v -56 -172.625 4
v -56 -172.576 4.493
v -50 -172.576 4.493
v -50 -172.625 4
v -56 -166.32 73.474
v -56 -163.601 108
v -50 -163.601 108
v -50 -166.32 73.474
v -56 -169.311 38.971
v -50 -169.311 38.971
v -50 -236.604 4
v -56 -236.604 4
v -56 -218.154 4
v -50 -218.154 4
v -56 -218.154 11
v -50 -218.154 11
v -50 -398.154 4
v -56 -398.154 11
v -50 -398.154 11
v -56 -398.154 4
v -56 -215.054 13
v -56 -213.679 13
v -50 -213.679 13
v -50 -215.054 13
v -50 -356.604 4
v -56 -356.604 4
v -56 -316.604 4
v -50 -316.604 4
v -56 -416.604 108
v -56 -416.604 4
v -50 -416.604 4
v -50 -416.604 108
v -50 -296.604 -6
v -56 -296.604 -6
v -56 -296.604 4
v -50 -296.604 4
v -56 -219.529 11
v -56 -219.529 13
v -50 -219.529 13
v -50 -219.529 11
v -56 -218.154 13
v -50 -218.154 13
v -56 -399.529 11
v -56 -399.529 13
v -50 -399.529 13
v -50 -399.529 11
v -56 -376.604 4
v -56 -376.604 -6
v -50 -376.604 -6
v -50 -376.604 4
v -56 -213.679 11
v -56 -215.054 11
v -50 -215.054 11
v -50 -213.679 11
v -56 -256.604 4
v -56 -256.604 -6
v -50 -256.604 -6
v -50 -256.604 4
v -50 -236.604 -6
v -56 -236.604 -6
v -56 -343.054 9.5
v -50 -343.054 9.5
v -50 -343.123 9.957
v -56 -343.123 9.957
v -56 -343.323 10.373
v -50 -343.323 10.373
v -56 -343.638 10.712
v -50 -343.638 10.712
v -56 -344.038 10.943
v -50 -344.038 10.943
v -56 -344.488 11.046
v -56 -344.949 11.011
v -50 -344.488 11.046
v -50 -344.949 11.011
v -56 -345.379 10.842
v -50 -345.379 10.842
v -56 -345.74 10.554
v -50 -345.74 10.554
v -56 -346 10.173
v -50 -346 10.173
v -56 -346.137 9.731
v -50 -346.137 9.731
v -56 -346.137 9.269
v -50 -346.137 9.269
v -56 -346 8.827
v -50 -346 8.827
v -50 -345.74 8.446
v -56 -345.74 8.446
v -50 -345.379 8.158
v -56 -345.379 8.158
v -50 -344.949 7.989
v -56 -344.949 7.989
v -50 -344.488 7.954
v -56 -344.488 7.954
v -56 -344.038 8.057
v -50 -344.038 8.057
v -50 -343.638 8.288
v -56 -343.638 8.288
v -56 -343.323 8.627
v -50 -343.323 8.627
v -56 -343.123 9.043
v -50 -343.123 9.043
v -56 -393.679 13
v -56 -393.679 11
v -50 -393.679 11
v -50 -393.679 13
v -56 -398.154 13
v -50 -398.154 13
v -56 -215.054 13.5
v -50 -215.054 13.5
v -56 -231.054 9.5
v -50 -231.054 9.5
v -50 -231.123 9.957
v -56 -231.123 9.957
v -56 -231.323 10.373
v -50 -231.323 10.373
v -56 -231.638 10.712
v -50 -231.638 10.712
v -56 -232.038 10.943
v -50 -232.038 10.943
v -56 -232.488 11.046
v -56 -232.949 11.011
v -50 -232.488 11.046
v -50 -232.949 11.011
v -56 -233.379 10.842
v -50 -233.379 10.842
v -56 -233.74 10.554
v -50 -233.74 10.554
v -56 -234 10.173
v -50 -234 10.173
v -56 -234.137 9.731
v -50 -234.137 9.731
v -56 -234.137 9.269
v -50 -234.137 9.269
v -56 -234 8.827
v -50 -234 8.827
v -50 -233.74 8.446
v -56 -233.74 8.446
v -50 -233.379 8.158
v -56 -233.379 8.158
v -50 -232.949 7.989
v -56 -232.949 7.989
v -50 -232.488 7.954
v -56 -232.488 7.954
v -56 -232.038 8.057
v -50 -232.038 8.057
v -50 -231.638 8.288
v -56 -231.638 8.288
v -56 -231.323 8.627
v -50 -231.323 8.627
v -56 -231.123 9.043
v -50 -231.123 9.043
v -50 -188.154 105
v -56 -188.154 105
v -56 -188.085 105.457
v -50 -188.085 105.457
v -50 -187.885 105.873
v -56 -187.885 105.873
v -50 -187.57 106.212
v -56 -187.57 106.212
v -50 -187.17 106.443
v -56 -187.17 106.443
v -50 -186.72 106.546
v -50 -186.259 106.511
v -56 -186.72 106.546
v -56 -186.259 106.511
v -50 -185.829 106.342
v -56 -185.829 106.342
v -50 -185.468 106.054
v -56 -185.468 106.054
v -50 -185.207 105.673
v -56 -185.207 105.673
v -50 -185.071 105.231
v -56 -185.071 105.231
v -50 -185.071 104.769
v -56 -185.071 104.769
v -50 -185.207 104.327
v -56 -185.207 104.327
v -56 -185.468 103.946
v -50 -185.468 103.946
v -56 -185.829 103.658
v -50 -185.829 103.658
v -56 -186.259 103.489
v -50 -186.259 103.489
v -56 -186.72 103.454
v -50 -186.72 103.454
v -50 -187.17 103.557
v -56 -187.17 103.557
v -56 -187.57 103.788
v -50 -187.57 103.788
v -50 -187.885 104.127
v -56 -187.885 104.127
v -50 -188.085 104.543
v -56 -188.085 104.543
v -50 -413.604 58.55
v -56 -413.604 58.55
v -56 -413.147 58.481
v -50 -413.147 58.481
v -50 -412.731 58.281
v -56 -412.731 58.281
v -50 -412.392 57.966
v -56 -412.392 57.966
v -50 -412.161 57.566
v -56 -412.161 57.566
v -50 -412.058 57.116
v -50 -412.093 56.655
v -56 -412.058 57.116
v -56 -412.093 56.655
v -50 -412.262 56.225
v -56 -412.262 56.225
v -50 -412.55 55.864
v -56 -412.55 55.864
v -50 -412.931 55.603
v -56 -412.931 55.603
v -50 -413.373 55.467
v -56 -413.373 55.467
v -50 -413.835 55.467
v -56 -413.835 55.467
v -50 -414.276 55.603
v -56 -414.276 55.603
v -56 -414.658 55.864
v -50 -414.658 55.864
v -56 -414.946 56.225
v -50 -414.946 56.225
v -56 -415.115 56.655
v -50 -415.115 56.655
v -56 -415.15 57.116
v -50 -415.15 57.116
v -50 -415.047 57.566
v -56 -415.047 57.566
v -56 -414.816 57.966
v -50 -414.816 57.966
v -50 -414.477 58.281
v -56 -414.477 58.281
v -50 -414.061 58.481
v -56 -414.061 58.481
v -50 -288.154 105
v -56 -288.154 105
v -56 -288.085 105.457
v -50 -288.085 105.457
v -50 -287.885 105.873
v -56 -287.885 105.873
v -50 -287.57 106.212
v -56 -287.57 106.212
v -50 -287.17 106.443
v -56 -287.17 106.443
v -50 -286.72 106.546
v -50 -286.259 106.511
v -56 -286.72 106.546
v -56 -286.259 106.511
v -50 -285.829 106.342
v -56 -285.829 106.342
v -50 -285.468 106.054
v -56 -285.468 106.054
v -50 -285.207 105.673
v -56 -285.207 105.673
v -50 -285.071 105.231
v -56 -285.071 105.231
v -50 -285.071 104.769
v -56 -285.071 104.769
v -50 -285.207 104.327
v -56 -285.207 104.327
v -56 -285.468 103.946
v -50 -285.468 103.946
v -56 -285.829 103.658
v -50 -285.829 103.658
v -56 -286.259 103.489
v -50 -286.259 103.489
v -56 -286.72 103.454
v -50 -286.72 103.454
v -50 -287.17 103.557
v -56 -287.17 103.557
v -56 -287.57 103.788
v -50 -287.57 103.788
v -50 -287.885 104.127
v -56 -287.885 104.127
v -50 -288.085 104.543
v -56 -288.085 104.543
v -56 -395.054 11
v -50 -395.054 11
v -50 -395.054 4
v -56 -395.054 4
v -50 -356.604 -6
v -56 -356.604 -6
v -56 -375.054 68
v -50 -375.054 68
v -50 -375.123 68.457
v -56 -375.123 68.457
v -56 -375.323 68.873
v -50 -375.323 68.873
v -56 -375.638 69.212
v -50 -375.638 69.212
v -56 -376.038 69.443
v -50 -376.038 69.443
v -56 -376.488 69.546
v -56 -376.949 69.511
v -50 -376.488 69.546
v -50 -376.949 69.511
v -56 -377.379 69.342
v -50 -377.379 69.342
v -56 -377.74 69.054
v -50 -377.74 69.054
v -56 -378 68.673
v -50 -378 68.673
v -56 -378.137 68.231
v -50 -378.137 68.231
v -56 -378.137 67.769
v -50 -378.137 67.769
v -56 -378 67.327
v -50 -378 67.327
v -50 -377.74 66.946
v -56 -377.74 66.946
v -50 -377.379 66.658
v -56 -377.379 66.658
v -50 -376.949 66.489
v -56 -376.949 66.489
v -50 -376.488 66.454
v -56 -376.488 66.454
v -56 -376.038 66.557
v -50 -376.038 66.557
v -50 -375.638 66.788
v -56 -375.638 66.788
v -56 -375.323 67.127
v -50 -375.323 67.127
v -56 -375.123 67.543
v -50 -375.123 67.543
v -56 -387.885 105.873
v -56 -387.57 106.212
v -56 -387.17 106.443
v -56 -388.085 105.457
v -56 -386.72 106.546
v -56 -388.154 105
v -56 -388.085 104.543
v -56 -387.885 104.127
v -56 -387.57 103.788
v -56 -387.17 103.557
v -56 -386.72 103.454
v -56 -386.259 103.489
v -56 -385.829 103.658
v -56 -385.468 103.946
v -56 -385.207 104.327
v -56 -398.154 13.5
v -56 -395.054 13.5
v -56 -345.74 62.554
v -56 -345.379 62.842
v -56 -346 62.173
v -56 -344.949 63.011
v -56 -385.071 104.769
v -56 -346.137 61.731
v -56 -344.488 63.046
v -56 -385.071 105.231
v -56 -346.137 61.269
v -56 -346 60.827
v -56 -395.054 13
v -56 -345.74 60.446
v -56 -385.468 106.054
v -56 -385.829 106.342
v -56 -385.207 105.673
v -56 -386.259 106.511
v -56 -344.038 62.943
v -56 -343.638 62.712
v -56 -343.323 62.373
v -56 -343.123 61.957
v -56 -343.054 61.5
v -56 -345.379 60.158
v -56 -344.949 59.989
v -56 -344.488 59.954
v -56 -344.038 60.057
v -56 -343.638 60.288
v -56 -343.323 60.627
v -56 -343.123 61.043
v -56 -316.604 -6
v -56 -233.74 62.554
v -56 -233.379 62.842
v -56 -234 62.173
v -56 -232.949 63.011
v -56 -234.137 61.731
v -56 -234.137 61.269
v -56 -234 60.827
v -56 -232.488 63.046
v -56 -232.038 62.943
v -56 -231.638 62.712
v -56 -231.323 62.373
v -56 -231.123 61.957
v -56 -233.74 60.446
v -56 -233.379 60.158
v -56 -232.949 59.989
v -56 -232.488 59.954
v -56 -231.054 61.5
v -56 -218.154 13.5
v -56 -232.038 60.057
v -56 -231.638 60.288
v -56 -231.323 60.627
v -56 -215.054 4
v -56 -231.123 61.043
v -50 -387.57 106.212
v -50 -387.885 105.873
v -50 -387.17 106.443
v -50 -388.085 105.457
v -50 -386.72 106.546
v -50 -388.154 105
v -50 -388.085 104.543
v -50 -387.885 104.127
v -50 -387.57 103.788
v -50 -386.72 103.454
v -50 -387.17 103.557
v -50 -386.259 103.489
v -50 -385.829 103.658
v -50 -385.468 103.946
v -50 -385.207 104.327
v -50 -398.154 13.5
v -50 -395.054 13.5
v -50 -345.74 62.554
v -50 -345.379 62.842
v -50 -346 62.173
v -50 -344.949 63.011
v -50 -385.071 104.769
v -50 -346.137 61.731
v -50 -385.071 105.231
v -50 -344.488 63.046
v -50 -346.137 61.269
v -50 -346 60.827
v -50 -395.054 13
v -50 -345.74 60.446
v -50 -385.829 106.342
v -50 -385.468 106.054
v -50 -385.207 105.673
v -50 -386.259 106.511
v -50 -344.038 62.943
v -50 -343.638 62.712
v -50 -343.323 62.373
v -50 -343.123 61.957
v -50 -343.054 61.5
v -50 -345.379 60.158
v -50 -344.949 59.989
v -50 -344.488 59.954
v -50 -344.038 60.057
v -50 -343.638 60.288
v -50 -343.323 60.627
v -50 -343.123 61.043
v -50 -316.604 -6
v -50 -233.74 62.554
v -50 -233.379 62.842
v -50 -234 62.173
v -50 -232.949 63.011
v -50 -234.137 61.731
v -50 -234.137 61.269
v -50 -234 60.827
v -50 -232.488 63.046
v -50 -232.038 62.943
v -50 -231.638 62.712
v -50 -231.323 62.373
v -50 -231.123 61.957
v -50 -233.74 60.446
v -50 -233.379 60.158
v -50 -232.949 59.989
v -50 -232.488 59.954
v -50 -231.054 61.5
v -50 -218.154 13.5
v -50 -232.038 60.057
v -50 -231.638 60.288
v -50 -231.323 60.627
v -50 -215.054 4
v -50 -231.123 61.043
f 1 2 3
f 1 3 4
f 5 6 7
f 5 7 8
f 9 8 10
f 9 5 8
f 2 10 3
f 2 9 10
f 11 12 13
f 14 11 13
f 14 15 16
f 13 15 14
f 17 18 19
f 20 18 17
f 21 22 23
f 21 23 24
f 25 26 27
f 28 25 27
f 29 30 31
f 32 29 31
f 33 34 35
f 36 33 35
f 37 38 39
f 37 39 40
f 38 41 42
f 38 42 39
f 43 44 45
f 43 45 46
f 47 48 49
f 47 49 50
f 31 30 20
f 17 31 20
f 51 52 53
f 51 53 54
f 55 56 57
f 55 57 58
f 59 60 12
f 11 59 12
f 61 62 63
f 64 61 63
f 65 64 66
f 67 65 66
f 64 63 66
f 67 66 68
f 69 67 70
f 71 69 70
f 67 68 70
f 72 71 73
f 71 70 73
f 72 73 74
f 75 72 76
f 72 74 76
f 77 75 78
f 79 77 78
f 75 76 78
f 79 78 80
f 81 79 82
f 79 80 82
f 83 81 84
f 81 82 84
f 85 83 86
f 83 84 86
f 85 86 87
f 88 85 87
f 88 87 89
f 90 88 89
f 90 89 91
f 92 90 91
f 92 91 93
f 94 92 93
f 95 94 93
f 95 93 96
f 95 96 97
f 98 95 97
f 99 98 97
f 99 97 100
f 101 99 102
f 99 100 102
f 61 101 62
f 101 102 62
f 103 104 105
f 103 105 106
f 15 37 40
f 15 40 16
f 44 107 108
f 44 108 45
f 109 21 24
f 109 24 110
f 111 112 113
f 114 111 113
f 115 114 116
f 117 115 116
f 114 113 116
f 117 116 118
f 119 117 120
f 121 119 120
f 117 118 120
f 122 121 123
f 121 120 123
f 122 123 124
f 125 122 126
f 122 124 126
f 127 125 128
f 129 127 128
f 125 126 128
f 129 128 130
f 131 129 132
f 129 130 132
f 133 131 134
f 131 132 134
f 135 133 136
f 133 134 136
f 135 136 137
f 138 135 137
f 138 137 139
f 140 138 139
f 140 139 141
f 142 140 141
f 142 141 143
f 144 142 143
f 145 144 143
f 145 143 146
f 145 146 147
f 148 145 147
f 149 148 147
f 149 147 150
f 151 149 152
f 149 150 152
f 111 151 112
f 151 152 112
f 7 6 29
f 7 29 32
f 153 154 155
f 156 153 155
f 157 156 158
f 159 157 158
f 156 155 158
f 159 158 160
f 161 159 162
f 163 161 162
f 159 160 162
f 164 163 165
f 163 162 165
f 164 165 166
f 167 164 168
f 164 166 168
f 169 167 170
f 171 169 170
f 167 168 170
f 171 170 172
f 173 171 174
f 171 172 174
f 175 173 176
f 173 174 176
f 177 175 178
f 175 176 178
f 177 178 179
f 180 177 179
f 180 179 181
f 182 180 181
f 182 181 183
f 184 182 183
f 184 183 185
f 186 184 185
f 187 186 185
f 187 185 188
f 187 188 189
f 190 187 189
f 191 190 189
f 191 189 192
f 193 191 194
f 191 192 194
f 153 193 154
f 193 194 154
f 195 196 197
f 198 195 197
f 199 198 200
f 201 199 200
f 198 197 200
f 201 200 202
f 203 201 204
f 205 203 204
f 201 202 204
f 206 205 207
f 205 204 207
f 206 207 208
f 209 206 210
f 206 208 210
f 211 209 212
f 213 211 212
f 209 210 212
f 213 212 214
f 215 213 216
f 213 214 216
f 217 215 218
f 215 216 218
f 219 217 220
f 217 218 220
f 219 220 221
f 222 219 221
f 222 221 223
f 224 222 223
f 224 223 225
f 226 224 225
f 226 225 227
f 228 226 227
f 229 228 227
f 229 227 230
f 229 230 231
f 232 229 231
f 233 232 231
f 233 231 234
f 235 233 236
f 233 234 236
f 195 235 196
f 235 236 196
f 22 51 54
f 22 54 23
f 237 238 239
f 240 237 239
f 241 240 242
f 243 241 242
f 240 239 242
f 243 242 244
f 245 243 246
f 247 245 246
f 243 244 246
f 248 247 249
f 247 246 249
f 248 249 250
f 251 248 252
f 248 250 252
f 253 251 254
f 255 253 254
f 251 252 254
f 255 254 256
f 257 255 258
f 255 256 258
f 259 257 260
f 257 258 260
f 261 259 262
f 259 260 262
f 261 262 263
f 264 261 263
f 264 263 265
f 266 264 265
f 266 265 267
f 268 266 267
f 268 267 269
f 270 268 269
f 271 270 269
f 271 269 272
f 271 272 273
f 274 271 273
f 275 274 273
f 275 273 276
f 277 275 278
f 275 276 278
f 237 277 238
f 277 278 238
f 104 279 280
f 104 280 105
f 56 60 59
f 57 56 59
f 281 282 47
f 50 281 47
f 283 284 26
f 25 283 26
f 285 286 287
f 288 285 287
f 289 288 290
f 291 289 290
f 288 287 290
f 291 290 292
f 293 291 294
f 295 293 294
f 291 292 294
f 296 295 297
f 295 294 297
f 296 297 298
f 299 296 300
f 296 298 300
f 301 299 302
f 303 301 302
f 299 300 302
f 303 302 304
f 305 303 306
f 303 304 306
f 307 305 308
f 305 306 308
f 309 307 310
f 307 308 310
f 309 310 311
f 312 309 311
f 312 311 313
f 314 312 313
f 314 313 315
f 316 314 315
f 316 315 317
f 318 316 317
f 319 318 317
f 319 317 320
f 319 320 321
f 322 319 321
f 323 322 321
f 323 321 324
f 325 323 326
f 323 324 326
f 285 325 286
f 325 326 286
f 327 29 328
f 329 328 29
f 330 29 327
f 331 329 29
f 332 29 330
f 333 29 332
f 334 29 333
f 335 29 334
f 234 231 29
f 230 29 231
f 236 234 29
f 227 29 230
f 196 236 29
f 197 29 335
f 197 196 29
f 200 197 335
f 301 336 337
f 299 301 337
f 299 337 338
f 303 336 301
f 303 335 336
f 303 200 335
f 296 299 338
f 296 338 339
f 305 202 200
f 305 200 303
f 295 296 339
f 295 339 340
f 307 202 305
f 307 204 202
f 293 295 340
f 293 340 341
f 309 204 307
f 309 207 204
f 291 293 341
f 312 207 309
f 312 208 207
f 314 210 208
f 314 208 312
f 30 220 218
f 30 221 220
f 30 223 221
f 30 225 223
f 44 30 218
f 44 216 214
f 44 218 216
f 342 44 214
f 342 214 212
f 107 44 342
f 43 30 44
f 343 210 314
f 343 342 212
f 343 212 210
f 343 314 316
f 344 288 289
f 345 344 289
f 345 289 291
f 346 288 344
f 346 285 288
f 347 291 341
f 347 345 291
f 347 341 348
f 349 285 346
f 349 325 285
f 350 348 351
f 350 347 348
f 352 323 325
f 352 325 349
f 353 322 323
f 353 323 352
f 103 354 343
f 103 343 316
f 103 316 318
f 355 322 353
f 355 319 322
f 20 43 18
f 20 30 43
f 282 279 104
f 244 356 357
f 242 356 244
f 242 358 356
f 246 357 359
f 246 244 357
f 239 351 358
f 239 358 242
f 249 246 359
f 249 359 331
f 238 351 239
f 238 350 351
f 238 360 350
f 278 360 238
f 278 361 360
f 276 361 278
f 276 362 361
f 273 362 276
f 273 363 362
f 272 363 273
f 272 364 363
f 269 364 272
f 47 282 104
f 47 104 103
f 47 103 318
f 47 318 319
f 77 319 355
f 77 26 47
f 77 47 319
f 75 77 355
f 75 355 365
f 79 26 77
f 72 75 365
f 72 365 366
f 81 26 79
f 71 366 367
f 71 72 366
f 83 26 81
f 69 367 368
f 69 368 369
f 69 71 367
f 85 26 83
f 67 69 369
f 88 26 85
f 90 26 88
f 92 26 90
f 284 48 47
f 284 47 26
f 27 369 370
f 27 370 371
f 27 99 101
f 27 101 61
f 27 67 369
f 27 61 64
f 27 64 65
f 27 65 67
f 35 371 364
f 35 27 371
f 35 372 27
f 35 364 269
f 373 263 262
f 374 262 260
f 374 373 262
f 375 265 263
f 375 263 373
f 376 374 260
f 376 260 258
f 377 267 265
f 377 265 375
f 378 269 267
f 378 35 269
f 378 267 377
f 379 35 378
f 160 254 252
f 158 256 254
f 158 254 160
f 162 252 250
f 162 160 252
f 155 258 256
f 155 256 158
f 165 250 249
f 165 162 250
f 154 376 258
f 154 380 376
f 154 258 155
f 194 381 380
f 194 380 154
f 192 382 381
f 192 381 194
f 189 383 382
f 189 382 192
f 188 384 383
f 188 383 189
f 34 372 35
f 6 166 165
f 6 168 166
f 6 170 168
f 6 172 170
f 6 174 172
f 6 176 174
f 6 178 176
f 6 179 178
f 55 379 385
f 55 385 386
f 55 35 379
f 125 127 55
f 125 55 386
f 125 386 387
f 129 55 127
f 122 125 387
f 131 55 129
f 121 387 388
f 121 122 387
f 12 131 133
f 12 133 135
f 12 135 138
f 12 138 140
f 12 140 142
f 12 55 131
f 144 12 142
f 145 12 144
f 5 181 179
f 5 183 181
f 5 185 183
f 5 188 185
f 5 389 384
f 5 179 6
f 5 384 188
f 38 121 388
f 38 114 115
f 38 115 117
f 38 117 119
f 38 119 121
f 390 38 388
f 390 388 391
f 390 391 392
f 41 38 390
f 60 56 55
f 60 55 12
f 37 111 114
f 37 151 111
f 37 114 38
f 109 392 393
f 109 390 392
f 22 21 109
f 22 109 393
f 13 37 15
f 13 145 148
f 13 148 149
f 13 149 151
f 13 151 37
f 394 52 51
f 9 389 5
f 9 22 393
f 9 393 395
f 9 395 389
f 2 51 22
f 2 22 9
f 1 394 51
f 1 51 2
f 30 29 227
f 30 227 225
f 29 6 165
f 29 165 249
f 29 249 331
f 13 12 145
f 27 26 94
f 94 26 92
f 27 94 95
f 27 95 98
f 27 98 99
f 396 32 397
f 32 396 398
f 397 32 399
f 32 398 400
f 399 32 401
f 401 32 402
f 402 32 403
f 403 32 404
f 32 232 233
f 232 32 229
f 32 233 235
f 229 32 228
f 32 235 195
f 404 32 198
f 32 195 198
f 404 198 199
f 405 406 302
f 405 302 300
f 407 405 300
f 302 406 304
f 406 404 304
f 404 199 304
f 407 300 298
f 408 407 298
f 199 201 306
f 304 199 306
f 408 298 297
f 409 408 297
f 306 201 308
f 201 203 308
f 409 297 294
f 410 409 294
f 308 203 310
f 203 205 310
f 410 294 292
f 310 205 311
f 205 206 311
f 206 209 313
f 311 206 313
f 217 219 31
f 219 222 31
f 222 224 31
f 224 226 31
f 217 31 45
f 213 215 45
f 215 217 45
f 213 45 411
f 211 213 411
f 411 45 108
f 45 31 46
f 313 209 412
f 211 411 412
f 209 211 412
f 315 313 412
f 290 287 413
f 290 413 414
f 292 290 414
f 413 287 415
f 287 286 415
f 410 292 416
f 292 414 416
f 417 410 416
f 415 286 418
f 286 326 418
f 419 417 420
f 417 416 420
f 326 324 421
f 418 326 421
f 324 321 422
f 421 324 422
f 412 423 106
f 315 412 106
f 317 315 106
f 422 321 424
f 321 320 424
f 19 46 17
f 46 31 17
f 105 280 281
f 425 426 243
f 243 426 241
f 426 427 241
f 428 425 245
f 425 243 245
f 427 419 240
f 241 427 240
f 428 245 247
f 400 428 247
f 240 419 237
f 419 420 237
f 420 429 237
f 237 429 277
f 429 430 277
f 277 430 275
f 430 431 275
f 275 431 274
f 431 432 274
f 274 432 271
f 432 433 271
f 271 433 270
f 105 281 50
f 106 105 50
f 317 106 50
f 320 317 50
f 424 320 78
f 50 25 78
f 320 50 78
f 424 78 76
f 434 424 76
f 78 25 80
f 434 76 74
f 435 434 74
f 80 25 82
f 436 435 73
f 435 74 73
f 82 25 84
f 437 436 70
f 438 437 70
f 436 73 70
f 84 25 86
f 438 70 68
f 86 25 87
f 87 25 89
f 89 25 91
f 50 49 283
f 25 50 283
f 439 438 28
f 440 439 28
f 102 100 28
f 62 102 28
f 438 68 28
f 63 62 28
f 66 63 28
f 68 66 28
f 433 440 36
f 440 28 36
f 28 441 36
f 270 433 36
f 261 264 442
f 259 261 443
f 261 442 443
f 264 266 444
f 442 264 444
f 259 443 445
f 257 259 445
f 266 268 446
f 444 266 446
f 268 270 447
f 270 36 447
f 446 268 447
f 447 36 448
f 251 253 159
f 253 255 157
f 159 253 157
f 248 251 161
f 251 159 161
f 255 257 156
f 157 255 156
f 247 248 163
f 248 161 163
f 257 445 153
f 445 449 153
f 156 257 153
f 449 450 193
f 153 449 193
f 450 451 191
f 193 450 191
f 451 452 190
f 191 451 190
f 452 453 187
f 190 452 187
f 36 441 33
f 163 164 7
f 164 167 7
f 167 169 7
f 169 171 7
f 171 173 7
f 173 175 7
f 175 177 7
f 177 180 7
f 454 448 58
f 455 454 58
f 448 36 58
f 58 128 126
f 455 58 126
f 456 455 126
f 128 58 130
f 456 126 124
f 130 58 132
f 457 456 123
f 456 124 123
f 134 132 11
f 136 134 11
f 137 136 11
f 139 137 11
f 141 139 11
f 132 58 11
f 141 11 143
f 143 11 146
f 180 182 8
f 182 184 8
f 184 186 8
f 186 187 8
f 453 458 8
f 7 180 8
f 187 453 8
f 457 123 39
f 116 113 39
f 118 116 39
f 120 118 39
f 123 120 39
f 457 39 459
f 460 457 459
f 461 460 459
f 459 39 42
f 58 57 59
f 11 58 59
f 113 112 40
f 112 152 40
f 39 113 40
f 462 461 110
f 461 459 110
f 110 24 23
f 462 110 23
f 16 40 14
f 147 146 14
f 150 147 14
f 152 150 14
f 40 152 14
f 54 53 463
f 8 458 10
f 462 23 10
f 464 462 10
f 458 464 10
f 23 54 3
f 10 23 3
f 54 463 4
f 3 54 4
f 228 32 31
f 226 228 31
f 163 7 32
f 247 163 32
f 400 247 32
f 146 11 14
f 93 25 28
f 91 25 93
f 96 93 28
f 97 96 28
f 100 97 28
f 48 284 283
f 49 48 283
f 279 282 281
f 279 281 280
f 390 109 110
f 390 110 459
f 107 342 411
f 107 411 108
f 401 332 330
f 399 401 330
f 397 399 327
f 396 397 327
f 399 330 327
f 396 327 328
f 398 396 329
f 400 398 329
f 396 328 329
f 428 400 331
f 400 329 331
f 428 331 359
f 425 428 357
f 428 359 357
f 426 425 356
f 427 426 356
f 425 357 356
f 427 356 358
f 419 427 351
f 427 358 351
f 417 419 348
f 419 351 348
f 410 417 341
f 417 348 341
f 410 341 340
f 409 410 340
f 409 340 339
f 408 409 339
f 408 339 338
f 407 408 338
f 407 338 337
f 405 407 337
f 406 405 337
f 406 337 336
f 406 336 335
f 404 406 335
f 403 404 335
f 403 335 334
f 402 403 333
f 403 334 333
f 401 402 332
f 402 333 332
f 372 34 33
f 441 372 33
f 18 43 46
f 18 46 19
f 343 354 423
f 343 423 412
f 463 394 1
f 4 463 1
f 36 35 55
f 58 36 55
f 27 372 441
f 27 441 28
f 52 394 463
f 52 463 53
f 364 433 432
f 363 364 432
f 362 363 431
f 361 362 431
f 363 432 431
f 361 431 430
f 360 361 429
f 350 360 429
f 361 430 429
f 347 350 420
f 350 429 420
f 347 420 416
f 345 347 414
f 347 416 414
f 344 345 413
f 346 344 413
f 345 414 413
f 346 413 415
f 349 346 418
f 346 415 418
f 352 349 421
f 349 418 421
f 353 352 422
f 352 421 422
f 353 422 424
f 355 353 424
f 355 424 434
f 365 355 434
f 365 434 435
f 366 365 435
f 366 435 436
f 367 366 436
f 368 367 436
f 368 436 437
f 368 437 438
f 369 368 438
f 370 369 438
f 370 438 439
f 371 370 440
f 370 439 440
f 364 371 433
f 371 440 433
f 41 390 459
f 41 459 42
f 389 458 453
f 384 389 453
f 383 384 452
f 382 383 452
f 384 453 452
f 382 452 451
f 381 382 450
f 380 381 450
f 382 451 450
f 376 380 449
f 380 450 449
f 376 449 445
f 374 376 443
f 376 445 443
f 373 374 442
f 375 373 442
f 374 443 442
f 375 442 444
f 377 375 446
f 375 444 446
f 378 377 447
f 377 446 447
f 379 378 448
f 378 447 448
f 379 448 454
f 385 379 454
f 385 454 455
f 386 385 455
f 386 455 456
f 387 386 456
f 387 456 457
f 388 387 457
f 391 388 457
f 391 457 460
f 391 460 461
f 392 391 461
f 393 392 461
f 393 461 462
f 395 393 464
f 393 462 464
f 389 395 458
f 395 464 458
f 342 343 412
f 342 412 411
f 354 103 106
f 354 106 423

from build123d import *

# Parameters (mm, degrees)
DODANIE_WYCI_GNI_CIE1_DEPTH      = 108
DODANIE_WYCI_GNI_CIE1_DEPTH_BACK = 6
SZKIC1_W                         = 6
SZKIC1_H                         = 327
SZKIC2_W                         = 10
SZKIC2_H                         = 40
WYTNIJ_WYCI_GNI_CIE1_DEPTH       = 6
SZKIC7_R                         = 1.55
WYTNIJ_WYCI_GNI_CIE2_DEPTH       = 6
WYTNIJ_WYCI_GNI_CIE3_DEPTH       = 6
SZYK_LINIOWY1_COUNT              = 2
SZYK_LINIOWY1_PITCH              = 180
SZKIC9_W                         = 22
SZKIC9_H                         = 13
WYTNIJ_WYCI_GNI_CIE4_DEPTH       = 6
SZKIC11_R                        = 1.55
WYTNIJ_WYCI_GNI_CIE5_DEPTH       = 6
SZYK_LINIOWY2_COUNT              = 2
SZYK_LINIOWY2_PITCH              = 100
SZYK_LINIOWY2_COL_COUNT          = 2
SZYK_LINIOWY2_COL_PITCH          = 200
SZKIC14_R                        = 1.55
WYTNIJ_WYCI_GNI_CIE7_DEPTH       = 6
WYTNIJ_WYCI_GNI_CIE9_DEPTH       = 6


with BuildPart() as part:
    # Szkic1 → Dodanie-wyciągnięcie1 (new, two sides: drawn at the far end of the back side and taken through both)
    with BuildSketch(Plane.XY.offset(-DODANIE_WYCI_GNI_CIE1_DEPTH_BACK)):
        with Locations((-53, -253.103962956)):
            Rectangle(SZKIC1_W, SZKIC1_H)
    extrude(amount=DODANIE_WYCI_GNI_CIE1_DEPTH + DODANIE_WYCI_GNI_CIE1_DEPTH_BACK)

    # Szkic2 → Wytnij-wyciągnięcie1 (cut)
    with BuildSketch(Plane.ZY.offset(56)):
        with Locations((-1, -396.603962956)):
            Rectangle(SZKIC2_W, SZKIC2_H)
        with Locations((-1, -336.603962956)):
            Rectangle(SZKIC2_W, SZKIC2_H)
        Polygon((4, -176.603962956), (4, -42.619854706), (-6, -42.619854706), (-6, -176.603962956), (-6, -196.603962956), (-6, -236.603962956), (4, -236.603962956), (4, -196.603962956), align=None)
        with Locations((-1, -276.603962956)):
            Rectangle(SZKIC2_W, SZKIC2_H)
    extrude(amount=-WYTNIJ_WYCI_GNI_CIE1_DEPTH, mode=Mode.SUBTRACT)

    # Szkic7 → Wytnij-wyciągnięcie2 (cut)
    with BuildSketch(Plane.ZY.offset(56)):
        with Locations((57, -413.603962956)):
            Circle(SZKIC7_R)
    extrude(amount=-WYTNIJ_WYCI_GNI_CIE2_DEPTH, mode=Mode.SUBTRACT)

    # Szkic8 → Wytnij-wyciągnięcie3 (cut)
    with BuildSketch(Plane.ZY.offset(56)):
        Polygon((4, -395.053962956), (11, -395.053962956), (11, -393.678962956), (13, -393.678962956), (13, -395.053962956), (13.5, -395.053962956), (13.5, -398.153962956), (13, -398.153962956), (13, -399.528962956), (11, -399.528962956), (11, -398.153962956), (4, -398.153962956), align=None)
    wytnij_wyci_gni_cie3 = extrude(amount=-WYTNIJ_WYCI_GNI_CIE3_DEPTH, mode=Mode.SUBTRACT)

    # Szyk liniowy1: Wytnij-wyciągnięcie3 ×2
    with Locations(*[(0, i * SZYK_LINIOWY1_PITCH, 0) for i in range(1, SZYK_LINIOWY1_COUNT)]):
        add(wytnij_wyci_gni_cie3, mode=Mode.SUBTRACT)

    # Szkic9 → Wytnij-wyciągnięcie4 (cut)
    with BuildSketch(Plane.ZY.offset(56)):
        with Locations((65, -96.103962956)):
            Rectangle(SZKIC9_W, SZKIC9_H)
    extrude(amount=-WYTNIJ_WYCI_GNI_CIE4_DEPTH, mode=Mode.SUBTRACT)

    # Szkic11 → Wytnij-wyciągnięcie5 (cut)
    with BuildSketch(Plane.ZY.offset(56)):
        with Locations(Location((105, -386.603962956, 0), (0, 0, 270))):
            Circle(SZKIC11_R)
    wytnij_wyci_gni_cie5 = extrude(amount=-WYTNIJ_WYCI_GNI_CIE5_DEPTH, mode=Mode.SUBTRACT)

    # Szyk liniowy2: Wytnij-wyciągnięcie5 ×2
    with Locations(*[(0, i * SZYK_LINIOWY2_PITCH, 0) for i in range(1, SZYK_LINIOWY2_COUNT)]):
        add(wytnij_wyci_gni_cie5, mode=Mode.SUBTRACT)

    # Szyk liniowy2 col: Wytnij-wyciągnięcie5 ×2
    with Locations(*[(0, i * SZYK_LINIOWY2_COL_PITCH, 0) for i in range(1, SZYK_LINIOWY2_COL_COUNT)]):
        add(wytnij_wyci_gni_cie5, mode=Mode.SUBTRACT)

    # Szkic14 → Wytnij-wyciągnięcie7 (cut)
    with BuildSketch(Plane(origin=(-50, 0, 0), x_dir=(0, 0, -1), z_dir=(1, 0, 0))):
        with Locations(Location((-68, -376.603962956, 0), (0, 0, 90))):
            Circle(SZKIC14_R)
        with Locations(Location((-9.5, -232.603962956, 0), (0, 0, 90))):
            Circle(SZKIC14_R)
        with Locations(Location((-61.5, -232.603962956, 0), (0, 0, 90))):
            Circle(SZKIC14_R)
        with Locations(Location((-61.5, -344.603962956, 0), (0, 0, 90))):
            Circle(SZKIC14_R)
        with Locations(Location((-9.5, -344.603962956, 0), (0, 0, 90))):
            Circle(SZKIC14_R)
    extrude(amount=-WYTNIJ_WYCI_GNI_CIE7_DEPTH, mode=Mode.SUBTRACT)

    # Szkic15 → Wytnij-wyciągnięcie9 (cut)
    with BuildSketch(Plane.ZY.offset(56)):
        with BuildLine():
            Line((4, -172.624757885), (4, -89.603962956))
            Line((4, -89.603962956), (54, -89.603962956))
            Line((54, -89.603962956), (54, -102.603962956))
            Line((54, -102.603962956), (76, -102.603962956))
            Line((76, -102.603962956), (76, -89.603962956))
            Line((76, -89.603962956), (108, -89.603962956))
            Line((108, -89.603962956), (108, -163.601221201))
            ThreePointArc((108, -163.601221201), (56.219772668, -167.781476219), (4.492818283, -172.576125802))
            Line((4.492818283, -172.576125802), (4, -172.624757885))
        make_face()
    extrude(amount=-WYTNIJ_WYCI_GNI_CIE9_DEPTH, mode=Mode.SUBTRACT)


solid = part.part
